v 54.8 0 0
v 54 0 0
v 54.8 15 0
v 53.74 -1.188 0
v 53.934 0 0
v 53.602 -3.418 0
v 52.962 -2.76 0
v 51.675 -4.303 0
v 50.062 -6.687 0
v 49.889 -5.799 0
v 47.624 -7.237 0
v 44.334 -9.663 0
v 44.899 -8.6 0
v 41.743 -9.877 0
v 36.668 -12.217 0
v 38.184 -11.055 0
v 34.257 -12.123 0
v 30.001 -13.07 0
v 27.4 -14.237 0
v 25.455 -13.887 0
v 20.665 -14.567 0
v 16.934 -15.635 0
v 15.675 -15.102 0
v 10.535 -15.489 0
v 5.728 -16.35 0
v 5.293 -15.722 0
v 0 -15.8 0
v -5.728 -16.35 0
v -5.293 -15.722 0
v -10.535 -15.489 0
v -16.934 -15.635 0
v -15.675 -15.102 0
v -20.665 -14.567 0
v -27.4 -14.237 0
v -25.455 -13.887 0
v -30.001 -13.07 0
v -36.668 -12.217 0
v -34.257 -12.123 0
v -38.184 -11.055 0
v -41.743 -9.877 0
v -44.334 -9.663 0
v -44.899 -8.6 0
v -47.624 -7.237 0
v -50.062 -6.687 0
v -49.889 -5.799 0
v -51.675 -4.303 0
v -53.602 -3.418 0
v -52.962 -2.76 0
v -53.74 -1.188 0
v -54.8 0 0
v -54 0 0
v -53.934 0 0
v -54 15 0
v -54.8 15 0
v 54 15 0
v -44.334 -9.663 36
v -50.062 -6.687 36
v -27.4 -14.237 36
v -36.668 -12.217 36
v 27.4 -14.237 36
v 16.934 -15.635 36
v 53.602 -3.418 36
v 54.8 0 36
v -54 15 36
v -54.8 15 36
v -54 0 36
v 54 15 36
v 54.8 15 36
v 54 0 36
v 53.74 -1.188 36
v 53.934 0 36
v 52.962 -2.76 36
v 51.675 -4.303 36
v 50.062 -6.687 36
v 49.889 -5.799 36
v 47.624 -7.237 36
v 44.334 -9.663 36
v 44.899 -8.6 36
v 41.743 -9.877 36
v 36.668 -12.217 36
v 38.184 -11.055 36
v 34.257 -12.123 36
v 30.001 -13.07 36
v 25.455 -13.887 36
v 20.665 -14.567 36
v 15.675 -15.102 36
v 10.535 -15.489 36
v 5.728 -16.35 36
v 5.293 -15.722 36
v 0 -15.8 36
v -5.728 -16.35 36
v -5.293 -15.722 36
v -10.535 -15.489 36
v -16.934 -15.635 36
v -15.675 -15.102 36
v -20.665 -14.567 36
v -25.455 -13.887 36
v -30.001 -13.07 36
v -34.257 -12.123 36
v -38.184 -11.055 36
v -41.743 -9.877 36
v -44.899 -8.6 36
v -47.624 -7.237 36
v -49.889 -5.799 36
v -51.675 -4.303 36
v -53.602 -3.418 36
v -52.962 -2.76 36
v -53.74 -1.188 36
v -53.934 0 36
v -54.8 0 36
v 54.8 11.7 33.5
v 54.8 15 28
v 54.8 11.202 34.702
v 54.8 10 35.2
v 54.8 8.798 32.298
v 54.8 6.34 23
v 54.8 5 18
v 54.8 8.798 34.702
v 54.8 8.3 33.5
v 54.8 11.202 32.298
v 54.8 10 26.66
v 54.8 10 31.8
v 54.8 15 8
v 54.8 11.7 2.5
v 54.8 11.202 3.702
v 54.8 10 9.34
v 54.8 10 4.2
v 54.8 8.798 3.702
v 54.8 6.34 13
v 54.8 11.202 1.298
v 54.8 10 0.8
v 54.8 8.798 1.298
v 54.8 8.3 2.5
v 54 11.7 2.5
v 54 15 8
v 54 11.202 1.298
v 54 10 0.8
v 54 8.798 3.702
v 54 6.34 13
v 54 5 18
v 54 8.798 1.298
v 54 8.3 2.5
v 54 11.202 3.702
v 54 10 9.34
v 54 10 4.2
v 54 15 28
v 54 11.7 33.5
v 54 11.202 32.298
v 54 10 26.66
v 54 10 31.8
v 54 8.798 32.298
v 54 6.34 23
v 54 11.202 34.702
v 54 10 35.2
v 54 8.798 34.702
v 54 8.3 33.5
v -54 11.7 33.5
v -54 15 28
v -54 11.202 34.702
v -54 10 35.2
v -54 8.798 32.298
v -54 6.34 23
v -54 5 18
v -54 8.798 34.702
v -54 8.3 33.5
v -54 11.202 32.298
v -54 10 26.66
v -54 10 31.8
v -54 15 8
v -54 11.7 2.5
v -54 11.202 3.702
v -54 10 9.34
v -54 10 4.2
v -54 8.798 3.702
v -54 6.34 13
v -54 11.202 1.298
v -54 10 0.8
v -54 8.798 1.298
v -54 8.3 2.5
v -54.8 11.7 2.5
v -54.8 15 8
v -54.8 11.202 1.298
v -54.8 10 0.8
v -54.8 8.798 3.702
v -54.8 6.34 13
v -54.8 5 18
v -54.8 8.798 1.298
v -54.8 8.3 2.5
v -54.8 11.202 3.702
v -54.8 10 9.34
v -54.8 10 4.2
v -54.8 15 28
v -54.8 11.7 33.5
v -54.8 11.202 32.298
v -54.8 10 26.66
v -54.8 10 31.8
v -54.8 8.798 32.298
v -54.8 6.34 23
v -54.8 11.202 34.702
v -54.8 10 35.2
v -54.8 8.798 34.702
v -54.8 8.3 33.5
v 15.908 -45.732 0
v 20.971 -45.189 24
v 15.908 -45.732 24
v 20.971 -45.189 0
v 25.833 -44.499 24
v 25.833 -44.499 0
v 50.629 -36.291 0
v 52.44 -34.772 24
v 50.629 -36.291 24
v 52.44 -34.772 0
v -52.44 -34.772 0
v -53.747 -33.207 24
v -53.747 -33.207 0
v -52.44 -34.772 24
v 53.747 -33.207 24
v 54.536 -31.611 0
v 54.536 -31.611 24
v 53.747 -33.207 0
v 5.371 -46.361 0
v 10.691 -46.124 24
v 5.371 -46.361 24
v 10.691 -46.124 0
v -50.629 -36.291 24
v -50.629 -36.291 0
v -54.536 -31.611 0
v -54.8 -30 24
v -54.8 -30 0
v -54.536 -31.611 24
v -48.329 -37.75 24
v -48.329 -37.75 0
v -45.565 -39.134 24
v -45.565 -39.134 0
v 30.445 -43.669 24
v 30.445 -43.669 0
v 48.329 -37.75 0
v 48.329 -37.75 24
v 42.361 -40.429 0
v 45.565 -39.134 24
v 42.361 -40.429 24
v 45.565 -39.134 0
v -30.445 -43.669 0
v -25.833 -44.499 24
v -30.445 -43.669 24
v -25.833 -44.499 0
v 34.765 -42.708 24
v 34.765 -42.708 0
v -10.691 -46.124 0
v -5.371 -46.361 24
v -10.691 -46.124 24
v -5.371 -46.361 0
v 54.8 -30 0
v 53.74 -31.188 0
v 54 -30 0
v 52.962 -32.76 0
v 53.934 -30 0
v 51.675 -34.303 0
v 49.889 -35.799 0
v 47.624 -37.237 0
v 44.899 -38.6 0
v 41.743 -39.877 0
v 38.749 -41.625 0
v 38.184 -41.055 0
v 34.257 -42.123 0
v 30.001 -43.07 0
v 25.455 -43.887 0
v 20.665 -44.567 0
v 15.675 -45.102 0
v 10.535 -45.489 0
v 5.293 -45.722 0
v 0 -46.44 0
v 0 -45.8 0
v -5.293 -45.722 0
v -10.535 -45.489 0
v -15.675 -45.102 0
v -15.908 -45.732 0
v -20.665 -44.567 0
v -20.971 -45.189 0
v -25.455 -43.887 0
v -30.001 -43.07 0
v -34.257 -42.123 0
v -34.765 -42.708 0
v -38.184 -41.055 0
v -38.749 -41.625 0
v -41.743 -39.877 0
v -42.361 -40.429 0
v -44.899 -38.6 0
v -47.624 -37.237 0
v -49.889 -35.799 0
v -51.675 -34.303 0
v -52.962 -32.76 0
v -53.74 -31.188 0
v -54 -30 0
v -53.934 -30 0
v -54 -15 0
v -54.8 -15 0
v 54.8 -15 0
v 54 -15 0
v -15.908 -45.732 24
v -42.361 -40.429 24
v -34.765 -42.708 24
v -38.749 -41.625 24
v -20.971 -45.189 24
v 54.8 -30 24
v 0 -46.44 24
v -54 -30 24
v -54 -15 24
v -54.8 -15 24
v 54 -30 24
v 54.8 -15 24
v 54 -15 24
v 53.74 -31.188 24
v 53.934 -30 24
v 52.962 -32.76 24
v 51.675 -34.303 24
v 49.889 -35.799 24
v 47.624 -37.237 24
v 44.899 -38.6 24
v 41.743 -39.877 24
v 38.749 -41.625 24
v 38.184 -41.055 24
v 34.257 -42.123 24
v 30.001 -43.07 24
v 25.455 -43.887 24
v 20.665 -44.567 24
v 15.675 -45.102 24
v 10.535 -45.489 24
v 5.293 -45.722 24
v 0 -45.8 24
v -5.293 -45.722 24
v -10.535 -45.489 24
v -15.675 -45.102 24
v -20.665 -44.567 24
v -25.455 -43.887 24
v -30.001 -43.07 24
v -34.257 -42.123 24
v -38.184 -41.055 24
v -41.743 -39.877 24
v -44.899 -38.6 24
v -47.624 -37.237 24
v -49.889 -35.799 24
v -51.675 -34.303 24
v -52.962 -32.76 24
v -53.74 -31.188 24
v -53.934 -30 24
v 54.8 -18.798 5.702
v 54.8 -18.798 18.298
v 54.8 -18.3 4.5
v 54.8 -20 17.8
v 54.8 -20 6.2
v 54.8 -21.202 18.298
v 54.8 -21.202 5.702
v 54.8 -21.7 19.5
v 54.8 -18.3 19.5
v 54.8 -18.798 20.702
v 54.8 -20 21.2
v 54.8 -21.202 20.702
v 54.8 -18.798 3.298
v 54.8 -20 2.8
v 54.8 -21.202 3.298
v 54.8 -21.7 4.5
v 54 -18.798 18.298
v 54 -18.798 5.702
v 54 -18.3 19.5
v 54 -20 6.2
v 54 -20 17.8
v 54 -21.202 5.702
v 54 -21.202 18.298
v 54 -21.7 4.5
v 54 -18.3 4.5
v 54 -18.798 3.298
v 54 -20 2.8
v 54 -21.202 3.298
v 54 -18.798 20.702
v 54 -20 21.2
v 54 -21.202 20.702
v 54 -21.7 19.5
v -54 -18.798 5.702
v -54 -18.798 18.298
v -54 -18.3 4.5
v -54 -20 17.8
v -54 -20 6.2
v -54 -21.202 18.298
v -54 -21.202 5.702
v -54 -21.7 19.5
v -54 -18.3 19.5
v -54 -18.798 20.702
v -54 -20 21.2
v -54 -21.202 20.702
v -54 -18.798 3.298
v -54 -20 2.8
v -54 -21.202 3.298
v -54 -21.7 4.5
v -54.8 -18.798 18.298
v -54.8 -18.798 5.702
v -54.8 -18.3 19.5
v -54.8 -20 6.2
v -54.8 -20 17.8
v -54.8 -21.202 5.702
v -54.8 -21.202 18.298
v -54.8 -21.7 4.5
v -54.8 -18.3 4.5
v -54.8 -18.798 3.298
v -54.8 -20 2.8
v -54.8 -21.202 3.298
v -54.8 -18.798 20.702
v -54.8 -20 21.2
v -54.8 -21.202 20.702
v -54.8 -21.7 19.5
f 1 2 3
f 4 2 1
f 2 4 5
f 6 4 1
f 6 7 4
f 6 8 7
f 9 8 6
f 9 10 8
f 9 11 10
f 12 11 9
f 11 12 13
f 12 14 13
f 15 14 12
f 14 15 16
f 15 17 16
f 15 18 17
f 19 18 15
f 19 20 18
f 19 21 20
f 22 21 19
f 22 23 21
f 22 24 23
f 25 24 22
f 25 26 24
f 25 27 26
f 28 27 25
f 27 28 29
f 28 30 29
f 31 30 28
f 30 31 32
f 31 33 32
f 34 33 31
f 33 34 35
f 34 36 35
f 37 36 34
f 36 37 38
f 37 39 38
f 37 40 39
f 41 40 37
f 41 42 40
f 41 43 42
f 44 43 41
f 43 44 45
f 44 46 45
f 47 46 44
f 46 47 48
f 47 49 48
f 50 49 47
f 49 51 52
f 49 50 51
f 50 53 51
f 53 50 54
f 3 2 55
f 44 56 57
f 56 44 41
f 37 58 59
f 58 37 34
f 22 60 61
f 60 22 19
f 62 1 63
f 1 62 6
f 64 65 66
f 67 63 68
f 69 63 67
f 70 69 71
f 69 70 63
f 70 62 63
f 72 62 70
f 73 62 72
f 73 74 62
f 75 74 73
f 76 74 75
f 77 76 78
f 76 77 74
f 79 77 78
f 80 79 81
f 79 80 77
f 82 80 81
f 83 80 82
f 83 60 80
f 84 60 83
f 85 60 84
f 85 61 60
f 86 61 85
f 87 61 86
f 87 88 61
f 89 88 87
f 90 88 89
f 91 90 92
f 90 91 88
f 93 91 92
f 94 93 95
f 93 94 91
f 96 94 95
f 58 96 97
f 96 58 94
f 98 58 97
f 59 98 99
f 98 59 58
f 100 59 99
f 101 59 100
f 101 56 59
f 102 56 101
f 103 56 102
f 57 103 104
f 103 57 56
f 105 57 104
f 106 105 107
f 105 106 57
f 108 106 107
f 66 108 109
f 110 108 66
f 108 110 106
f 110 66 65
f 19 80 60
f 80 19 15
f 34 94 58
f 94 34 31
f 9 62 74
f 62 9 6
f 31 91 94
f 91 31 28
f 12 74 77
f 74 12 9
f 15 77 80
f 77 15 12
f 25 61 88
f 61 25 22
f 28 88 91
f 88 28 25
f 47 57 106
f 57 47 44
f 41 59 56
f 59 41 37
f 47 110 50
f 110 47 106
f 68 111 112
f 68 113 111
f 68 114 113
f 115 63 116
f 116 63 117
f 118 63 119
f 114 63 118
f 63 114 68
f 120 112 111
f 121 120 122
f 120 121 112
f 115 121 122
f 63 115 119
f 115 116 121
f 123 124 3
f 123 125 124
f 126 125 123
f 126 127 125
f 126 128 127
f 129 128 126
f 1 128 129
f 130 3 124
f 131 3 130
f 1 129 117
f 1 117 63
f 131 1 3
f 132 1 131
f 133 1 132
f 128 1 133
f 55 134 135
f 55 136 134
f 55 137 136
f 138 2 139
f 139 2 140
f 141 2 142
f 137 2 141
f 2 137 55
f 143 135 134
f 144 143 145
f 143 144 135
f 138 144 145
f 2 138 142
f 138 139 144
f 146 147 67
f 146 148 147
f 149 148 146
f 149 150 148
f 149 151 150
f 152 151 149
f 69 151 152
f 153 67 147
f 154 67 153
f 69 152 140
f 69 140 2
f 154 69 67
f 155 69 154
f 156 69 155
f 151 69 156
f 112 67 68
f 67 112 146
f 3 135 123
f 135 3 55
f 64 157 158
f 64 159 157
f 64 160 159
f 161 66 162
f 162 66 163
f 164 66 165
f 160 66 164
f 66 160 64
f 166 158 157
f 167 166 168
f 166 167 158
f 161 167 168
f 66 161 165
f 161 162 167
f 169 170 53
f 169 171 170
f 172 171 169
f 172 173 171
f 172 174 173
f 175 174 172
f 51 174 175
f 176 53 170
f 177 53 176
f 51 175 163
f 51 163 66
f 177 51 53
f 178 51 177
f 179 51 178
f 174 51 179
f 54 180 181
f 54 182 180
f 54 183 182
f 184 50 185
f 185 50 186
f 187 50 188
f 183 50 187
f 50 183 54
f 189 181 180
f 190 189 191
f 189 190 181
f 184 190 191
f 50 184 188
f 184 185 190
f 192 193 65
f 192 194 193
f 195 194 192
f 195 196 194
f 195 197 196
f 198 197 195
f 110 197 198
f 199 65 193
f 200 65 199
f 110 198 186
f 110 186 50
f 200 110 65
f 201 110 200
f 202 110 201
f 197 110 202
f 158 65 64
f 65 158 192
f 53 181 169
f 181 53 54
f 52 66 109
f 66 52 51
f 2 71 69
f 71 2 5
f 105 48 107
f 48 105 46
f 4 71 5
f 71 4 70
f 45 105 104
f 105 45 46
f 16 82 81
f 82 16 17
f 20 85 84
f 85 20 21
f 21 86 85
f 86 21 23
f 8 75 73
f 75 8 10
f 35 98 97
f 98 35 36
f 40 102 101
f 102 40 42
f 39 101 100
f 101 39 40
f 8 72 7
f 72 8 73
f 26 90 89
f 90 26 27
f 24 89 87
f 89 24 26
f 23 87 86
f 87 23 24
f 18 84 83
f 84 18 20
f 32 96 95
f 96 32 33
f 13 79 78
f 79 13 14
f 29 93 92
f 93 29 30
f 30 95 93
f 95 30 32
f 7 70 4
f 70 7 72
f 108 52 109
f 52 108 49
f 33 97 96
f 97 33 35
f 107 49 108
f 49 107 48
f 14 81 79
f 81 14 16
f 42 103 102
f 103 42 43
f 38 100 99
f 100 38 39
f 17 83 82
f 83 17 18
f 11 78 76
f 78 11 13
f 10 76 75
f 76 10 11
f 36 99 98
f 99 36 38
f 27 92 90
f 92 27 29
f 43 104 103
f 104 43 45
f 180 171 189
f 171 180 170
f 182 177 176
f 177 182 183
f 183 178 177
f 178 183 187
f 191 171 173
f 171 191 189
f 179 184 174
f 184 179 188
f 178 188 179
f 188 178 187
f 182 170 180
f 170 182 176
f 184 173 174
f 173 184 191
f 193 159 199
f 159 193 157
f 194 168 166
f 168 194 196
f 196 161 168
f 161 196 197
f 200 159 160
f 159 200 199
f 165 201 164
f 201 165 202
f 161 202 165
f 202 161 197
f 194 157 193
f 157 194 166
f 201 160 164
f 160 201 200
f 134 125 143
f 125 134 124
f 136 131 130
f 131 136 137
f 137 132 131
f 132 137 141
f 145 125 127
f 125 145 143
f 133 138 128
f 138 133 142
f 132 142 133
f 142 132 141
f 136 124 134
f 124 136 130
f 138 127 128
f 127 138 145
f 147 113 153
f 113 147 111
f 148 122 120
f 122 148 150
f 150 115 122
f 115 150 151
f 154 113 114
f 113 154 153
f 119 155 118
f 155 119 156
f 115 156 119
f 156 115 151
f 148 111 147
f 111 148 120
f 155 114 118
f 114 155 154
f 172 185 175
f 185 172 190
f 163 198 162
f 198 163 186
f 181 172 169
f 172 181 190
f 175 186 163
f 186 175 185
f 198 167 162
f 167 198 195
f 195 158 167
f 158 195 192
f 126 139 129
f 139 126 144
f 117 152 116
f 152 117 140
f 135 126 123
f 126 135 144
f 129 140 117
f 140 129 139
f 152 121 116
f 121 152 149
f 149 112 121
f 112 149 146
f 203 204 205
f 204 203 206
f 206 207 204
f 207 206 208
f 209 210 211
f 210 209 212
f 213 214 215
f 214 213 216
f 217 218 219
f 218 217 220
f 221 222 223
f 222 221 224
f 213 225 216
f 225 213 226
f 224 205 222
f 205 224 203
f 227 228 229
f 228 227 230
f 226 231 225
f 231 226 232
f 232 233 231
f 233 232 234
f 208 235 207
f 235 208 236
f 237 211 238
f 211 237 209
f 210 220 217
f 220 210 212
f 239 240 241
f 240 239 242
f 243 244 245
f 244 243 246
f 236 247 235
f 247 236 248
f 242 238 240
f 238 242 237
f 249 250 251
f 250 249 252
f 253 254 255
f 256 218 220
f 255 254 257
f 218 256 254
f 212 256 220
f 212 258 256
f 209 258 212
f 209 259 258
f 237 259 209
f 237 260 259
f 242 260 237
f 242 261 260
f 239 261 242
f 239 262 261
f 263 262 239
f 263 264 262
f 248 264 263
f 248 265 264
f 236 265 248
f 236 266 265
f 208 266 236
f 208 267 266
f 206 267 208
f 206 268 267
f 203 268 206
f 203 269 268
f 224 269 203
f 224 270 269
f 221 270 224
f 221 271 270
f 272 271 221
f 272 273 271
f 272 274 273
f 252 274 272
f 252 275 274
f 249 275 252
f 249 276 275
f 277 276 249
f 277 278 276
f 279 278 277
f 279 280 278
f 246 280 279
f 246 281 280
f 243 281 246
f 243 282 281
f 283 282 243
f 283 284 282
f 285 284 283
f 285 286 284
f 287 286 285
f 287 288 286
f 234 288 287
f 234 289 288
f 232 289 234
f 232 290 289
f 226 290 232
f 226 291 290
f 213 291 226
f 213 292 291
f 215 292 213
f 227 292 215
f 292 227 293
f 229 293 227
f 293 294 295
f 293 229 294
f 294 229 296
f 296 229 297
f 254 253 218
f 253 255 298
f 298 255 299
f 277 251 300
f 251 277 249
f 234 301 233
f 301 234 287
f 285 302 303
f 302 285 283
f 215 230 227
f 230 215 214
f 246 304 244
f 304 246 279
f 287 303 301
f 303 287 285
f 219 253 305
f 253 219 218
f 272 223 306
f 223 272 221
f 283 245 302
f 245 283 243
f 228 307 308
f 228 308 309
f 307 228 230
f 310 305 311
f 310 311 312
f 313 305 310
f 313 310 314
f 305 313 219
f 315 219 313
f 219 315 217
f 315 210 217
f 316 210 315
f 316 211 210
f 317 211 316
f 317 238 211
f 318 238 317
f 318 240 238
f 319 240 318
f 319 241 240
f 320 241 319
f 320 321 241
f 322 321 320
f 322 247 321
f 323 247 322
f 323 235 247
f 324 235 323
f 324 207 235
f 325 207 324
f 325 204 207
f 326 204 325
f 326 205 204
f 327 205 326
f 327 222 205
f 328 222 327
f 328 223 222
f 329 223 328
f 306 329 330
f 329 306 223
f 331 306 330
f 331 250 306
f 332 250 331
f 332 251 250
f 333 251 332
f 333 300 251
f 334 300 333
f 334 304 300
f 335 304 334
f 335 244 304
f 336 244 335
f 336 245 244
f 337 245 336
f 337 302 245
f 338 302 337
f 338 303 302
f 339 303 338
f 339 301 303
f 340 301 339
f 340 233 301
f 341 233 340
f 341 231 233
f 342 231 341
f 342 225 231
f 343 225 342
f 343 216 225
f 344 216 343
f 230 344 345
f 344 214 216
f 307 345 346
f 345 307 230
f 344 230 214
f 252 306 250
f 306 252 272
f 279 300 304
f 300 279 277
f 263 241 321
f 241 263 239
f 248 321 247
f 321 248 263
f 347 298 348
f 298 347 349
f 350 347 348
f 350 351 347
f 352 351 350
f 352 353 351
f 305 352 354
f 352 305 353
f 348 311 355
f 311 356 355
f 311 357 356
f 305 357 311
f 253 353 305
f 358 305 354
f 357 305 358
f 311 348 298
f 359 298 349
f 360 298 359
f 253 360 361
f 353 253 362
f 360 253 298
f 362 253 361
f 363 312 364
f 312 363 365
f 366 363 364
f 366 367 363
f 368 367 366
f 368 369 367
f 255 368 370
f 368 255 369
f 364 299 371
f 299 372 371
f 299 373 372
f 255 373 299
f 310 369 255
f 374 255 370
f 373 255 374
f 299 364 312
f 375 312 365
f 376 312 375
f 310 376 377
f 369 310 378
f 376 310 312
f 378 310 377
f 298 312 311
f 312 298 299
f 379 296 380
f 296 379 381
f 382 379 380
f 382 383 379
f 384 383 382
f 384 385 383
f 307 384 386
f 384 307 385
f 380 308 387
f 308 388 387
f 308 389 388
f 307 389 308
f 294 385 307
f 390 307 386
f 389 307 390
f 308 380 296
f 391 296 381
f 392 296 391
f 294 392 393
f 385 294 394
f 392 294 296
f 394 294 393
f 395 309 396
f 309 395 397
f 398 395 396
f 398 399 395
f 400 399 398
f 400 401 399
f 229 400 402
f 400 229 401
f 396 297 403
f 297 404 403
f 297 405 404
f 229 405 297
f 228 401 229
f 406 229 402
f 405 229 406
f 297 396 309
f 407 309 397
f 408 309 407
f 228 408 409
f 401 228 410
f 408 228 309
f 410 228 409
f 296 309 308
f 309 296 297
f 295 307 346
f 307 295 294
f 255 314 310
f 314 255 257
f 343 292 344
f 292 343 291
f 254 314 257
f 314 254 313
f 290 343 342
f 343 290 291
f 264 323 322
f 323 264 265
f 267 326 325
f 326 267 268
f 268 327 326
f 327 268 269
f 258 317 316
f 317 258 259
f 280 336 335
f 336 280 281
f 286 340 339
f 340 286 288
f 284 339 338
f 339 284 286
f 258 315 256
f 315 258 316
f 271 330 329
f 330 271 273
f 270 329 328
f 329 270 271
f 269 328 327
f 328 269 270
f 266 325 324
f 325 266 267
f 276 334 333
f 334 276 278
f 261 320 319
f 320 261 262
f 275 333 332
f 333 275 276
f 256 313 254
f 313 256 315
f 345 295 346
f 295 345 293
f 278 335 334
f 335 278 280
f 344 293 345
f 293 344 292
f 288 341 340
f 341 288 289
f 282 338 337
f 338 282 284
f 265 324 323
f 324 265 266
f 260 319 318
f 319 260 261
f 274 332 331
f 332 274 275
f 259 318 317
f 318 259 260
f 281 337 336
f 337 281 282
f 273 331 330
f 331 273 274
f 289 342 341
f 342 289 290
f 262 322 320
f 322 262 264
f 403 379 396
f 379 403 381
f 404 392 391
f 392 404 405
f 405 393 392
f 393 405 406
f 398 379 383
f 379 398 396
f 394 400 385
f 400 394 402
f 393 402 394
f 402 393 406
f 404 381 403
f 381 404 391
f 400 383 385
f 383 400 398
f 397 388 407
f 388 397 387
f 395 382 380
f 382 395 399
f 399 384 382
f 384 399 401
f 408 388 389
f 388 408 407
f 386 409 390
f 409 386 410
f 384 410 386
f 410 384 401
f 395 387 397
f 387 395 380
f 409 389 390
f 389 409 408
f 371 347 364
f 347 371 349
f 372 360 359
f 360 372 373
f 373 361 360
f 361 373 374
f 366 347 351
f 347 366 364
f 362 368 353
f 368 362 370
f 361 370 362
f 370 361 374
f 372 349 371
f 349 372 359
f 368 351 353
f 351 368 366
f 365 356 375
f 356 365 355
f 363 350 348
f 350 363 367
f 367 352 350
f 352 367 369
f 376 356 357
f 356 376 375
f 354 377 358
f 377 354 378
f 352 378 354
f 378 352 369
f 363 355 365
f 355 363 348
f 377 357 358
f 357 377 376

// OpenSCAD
// Originally created by Jose Julio
// https://github.com/JJulio/b-robot

// Robot Body shell

LENGTH = 108;
WIDTH = 36;
WIDTH2 = 24;

module shroud()
{
  //translate([-LENGTH/2,0,0]) cube([LENGTH,WIDTH,1]);

  translate([0,0,WIDTH/2]) scale([1,0.30]) cylinder(r=LENGTH/2+0.8,h=WIDTH,$fn=30,center=true);
  translate([LENGTH/2,0,0]) cube([0.8,15,WIDTH]);
  translate([-LENGTH/2-0.8,0,0]) cube([0.8,15,WIDTH]);


}

module shroud_holes()
{
  translate([-LENGTH/2,0,-1]) cube([LENGTH,WIDTH,WIDTH+2]);
  translate([0,0.4,WIDTH/2]) scale([1,0.3]) cylinder(r=LENGTH/2,h=WIDTH+10,$fn=64,center=true);
  translate([-LENGTH/2,10,(WIDTH-31)/2]) rotate([0,90,0]) cylinder(r=1.7,h=10,center=true,$fn=8);
  translate([-LENGTH/2,10,(WIDTH-31)/2+31]) rotate([0,90,0]) cylinder(r=1.7,h=10,center=true,$fn=8);
  translate([LENGTH/2,10,(WIDTH-31)/2]) rotate([0,90,0]) cylinder(r=1.7,h=10,center=true,$fn=8);
  translate([LENGTH/2,10,(WIDTH-31)/2+31]) rotate([0,90,0]) cylinder(r=1.7,h=10,center=true,$fn=8);

  translate([-LENGTH/2,15,WIDTH/2]) rotate([0,90,0]) scale([1,1]) cylinder(r=10,h=10,center=true,$fn=12);
  translate([LENGTH/2,15,WIDTH/2])  rotate([0,90,0]) scale([1,1]) cylinder(r=10,h=10,center=true,$fn=12);
}

module shroud2()
{
  //translate([-LENGTH/2,0,0]) cube([LENGTH,WIDTH2,1]);

  translate([0,0,WIDTH2/2]) scale([1,0.30]) cylinder(r=LENGTH/2+0.8,h=WIDTH2,$fn=64,center=true);
  translate([LENGTH/2,0,0]) cube([0.8,15,WIDTH2]);
  translate([-LENGTH/2-0.8,0,0]) cube([0.8,15,WIDTH2]);


}

module shroud_holes2()
{
  translate([-LENGTH/2,0,-1]) cube([LENGTH,WIDTH2,WIDTH2+2]);
  translate([0,0.4,WIDTH2/2]) scale([1,0.3]) cylinder(r=LENGTH/2,h=WIDTH2+10,$fn=64,center=true);
  translate([-LENGTH/2,10,(WIDTH2-15)/2]) rotate([0,90,0]) cylinder(r=1.7,h=10,center=true,$fn=8);
  translate([-LENGTH/2,10,(WIDTH2-15)/2+15]) rotate([0,90,0]) cylinder(r=1.7,h=10,center=true,$fn=8);
  translate([LENGTH/2,10,(WIDTH2-15)/2]) rotate([0,90,0]) cylinder(r=1.7,h=10,center=true,$fn=8);
  translate([LENGTH/2,10,(WIDTH2-15)/2+15]) rotate([0,90,0]) cylinder(r=1.7,h=10,center=true,$fn=8);

}

difference()
{
  shroud();
  shroud_holes();
}

translate([0,-30,0]) difference()
{
  shroud2();
  shroud_holes2();
}
